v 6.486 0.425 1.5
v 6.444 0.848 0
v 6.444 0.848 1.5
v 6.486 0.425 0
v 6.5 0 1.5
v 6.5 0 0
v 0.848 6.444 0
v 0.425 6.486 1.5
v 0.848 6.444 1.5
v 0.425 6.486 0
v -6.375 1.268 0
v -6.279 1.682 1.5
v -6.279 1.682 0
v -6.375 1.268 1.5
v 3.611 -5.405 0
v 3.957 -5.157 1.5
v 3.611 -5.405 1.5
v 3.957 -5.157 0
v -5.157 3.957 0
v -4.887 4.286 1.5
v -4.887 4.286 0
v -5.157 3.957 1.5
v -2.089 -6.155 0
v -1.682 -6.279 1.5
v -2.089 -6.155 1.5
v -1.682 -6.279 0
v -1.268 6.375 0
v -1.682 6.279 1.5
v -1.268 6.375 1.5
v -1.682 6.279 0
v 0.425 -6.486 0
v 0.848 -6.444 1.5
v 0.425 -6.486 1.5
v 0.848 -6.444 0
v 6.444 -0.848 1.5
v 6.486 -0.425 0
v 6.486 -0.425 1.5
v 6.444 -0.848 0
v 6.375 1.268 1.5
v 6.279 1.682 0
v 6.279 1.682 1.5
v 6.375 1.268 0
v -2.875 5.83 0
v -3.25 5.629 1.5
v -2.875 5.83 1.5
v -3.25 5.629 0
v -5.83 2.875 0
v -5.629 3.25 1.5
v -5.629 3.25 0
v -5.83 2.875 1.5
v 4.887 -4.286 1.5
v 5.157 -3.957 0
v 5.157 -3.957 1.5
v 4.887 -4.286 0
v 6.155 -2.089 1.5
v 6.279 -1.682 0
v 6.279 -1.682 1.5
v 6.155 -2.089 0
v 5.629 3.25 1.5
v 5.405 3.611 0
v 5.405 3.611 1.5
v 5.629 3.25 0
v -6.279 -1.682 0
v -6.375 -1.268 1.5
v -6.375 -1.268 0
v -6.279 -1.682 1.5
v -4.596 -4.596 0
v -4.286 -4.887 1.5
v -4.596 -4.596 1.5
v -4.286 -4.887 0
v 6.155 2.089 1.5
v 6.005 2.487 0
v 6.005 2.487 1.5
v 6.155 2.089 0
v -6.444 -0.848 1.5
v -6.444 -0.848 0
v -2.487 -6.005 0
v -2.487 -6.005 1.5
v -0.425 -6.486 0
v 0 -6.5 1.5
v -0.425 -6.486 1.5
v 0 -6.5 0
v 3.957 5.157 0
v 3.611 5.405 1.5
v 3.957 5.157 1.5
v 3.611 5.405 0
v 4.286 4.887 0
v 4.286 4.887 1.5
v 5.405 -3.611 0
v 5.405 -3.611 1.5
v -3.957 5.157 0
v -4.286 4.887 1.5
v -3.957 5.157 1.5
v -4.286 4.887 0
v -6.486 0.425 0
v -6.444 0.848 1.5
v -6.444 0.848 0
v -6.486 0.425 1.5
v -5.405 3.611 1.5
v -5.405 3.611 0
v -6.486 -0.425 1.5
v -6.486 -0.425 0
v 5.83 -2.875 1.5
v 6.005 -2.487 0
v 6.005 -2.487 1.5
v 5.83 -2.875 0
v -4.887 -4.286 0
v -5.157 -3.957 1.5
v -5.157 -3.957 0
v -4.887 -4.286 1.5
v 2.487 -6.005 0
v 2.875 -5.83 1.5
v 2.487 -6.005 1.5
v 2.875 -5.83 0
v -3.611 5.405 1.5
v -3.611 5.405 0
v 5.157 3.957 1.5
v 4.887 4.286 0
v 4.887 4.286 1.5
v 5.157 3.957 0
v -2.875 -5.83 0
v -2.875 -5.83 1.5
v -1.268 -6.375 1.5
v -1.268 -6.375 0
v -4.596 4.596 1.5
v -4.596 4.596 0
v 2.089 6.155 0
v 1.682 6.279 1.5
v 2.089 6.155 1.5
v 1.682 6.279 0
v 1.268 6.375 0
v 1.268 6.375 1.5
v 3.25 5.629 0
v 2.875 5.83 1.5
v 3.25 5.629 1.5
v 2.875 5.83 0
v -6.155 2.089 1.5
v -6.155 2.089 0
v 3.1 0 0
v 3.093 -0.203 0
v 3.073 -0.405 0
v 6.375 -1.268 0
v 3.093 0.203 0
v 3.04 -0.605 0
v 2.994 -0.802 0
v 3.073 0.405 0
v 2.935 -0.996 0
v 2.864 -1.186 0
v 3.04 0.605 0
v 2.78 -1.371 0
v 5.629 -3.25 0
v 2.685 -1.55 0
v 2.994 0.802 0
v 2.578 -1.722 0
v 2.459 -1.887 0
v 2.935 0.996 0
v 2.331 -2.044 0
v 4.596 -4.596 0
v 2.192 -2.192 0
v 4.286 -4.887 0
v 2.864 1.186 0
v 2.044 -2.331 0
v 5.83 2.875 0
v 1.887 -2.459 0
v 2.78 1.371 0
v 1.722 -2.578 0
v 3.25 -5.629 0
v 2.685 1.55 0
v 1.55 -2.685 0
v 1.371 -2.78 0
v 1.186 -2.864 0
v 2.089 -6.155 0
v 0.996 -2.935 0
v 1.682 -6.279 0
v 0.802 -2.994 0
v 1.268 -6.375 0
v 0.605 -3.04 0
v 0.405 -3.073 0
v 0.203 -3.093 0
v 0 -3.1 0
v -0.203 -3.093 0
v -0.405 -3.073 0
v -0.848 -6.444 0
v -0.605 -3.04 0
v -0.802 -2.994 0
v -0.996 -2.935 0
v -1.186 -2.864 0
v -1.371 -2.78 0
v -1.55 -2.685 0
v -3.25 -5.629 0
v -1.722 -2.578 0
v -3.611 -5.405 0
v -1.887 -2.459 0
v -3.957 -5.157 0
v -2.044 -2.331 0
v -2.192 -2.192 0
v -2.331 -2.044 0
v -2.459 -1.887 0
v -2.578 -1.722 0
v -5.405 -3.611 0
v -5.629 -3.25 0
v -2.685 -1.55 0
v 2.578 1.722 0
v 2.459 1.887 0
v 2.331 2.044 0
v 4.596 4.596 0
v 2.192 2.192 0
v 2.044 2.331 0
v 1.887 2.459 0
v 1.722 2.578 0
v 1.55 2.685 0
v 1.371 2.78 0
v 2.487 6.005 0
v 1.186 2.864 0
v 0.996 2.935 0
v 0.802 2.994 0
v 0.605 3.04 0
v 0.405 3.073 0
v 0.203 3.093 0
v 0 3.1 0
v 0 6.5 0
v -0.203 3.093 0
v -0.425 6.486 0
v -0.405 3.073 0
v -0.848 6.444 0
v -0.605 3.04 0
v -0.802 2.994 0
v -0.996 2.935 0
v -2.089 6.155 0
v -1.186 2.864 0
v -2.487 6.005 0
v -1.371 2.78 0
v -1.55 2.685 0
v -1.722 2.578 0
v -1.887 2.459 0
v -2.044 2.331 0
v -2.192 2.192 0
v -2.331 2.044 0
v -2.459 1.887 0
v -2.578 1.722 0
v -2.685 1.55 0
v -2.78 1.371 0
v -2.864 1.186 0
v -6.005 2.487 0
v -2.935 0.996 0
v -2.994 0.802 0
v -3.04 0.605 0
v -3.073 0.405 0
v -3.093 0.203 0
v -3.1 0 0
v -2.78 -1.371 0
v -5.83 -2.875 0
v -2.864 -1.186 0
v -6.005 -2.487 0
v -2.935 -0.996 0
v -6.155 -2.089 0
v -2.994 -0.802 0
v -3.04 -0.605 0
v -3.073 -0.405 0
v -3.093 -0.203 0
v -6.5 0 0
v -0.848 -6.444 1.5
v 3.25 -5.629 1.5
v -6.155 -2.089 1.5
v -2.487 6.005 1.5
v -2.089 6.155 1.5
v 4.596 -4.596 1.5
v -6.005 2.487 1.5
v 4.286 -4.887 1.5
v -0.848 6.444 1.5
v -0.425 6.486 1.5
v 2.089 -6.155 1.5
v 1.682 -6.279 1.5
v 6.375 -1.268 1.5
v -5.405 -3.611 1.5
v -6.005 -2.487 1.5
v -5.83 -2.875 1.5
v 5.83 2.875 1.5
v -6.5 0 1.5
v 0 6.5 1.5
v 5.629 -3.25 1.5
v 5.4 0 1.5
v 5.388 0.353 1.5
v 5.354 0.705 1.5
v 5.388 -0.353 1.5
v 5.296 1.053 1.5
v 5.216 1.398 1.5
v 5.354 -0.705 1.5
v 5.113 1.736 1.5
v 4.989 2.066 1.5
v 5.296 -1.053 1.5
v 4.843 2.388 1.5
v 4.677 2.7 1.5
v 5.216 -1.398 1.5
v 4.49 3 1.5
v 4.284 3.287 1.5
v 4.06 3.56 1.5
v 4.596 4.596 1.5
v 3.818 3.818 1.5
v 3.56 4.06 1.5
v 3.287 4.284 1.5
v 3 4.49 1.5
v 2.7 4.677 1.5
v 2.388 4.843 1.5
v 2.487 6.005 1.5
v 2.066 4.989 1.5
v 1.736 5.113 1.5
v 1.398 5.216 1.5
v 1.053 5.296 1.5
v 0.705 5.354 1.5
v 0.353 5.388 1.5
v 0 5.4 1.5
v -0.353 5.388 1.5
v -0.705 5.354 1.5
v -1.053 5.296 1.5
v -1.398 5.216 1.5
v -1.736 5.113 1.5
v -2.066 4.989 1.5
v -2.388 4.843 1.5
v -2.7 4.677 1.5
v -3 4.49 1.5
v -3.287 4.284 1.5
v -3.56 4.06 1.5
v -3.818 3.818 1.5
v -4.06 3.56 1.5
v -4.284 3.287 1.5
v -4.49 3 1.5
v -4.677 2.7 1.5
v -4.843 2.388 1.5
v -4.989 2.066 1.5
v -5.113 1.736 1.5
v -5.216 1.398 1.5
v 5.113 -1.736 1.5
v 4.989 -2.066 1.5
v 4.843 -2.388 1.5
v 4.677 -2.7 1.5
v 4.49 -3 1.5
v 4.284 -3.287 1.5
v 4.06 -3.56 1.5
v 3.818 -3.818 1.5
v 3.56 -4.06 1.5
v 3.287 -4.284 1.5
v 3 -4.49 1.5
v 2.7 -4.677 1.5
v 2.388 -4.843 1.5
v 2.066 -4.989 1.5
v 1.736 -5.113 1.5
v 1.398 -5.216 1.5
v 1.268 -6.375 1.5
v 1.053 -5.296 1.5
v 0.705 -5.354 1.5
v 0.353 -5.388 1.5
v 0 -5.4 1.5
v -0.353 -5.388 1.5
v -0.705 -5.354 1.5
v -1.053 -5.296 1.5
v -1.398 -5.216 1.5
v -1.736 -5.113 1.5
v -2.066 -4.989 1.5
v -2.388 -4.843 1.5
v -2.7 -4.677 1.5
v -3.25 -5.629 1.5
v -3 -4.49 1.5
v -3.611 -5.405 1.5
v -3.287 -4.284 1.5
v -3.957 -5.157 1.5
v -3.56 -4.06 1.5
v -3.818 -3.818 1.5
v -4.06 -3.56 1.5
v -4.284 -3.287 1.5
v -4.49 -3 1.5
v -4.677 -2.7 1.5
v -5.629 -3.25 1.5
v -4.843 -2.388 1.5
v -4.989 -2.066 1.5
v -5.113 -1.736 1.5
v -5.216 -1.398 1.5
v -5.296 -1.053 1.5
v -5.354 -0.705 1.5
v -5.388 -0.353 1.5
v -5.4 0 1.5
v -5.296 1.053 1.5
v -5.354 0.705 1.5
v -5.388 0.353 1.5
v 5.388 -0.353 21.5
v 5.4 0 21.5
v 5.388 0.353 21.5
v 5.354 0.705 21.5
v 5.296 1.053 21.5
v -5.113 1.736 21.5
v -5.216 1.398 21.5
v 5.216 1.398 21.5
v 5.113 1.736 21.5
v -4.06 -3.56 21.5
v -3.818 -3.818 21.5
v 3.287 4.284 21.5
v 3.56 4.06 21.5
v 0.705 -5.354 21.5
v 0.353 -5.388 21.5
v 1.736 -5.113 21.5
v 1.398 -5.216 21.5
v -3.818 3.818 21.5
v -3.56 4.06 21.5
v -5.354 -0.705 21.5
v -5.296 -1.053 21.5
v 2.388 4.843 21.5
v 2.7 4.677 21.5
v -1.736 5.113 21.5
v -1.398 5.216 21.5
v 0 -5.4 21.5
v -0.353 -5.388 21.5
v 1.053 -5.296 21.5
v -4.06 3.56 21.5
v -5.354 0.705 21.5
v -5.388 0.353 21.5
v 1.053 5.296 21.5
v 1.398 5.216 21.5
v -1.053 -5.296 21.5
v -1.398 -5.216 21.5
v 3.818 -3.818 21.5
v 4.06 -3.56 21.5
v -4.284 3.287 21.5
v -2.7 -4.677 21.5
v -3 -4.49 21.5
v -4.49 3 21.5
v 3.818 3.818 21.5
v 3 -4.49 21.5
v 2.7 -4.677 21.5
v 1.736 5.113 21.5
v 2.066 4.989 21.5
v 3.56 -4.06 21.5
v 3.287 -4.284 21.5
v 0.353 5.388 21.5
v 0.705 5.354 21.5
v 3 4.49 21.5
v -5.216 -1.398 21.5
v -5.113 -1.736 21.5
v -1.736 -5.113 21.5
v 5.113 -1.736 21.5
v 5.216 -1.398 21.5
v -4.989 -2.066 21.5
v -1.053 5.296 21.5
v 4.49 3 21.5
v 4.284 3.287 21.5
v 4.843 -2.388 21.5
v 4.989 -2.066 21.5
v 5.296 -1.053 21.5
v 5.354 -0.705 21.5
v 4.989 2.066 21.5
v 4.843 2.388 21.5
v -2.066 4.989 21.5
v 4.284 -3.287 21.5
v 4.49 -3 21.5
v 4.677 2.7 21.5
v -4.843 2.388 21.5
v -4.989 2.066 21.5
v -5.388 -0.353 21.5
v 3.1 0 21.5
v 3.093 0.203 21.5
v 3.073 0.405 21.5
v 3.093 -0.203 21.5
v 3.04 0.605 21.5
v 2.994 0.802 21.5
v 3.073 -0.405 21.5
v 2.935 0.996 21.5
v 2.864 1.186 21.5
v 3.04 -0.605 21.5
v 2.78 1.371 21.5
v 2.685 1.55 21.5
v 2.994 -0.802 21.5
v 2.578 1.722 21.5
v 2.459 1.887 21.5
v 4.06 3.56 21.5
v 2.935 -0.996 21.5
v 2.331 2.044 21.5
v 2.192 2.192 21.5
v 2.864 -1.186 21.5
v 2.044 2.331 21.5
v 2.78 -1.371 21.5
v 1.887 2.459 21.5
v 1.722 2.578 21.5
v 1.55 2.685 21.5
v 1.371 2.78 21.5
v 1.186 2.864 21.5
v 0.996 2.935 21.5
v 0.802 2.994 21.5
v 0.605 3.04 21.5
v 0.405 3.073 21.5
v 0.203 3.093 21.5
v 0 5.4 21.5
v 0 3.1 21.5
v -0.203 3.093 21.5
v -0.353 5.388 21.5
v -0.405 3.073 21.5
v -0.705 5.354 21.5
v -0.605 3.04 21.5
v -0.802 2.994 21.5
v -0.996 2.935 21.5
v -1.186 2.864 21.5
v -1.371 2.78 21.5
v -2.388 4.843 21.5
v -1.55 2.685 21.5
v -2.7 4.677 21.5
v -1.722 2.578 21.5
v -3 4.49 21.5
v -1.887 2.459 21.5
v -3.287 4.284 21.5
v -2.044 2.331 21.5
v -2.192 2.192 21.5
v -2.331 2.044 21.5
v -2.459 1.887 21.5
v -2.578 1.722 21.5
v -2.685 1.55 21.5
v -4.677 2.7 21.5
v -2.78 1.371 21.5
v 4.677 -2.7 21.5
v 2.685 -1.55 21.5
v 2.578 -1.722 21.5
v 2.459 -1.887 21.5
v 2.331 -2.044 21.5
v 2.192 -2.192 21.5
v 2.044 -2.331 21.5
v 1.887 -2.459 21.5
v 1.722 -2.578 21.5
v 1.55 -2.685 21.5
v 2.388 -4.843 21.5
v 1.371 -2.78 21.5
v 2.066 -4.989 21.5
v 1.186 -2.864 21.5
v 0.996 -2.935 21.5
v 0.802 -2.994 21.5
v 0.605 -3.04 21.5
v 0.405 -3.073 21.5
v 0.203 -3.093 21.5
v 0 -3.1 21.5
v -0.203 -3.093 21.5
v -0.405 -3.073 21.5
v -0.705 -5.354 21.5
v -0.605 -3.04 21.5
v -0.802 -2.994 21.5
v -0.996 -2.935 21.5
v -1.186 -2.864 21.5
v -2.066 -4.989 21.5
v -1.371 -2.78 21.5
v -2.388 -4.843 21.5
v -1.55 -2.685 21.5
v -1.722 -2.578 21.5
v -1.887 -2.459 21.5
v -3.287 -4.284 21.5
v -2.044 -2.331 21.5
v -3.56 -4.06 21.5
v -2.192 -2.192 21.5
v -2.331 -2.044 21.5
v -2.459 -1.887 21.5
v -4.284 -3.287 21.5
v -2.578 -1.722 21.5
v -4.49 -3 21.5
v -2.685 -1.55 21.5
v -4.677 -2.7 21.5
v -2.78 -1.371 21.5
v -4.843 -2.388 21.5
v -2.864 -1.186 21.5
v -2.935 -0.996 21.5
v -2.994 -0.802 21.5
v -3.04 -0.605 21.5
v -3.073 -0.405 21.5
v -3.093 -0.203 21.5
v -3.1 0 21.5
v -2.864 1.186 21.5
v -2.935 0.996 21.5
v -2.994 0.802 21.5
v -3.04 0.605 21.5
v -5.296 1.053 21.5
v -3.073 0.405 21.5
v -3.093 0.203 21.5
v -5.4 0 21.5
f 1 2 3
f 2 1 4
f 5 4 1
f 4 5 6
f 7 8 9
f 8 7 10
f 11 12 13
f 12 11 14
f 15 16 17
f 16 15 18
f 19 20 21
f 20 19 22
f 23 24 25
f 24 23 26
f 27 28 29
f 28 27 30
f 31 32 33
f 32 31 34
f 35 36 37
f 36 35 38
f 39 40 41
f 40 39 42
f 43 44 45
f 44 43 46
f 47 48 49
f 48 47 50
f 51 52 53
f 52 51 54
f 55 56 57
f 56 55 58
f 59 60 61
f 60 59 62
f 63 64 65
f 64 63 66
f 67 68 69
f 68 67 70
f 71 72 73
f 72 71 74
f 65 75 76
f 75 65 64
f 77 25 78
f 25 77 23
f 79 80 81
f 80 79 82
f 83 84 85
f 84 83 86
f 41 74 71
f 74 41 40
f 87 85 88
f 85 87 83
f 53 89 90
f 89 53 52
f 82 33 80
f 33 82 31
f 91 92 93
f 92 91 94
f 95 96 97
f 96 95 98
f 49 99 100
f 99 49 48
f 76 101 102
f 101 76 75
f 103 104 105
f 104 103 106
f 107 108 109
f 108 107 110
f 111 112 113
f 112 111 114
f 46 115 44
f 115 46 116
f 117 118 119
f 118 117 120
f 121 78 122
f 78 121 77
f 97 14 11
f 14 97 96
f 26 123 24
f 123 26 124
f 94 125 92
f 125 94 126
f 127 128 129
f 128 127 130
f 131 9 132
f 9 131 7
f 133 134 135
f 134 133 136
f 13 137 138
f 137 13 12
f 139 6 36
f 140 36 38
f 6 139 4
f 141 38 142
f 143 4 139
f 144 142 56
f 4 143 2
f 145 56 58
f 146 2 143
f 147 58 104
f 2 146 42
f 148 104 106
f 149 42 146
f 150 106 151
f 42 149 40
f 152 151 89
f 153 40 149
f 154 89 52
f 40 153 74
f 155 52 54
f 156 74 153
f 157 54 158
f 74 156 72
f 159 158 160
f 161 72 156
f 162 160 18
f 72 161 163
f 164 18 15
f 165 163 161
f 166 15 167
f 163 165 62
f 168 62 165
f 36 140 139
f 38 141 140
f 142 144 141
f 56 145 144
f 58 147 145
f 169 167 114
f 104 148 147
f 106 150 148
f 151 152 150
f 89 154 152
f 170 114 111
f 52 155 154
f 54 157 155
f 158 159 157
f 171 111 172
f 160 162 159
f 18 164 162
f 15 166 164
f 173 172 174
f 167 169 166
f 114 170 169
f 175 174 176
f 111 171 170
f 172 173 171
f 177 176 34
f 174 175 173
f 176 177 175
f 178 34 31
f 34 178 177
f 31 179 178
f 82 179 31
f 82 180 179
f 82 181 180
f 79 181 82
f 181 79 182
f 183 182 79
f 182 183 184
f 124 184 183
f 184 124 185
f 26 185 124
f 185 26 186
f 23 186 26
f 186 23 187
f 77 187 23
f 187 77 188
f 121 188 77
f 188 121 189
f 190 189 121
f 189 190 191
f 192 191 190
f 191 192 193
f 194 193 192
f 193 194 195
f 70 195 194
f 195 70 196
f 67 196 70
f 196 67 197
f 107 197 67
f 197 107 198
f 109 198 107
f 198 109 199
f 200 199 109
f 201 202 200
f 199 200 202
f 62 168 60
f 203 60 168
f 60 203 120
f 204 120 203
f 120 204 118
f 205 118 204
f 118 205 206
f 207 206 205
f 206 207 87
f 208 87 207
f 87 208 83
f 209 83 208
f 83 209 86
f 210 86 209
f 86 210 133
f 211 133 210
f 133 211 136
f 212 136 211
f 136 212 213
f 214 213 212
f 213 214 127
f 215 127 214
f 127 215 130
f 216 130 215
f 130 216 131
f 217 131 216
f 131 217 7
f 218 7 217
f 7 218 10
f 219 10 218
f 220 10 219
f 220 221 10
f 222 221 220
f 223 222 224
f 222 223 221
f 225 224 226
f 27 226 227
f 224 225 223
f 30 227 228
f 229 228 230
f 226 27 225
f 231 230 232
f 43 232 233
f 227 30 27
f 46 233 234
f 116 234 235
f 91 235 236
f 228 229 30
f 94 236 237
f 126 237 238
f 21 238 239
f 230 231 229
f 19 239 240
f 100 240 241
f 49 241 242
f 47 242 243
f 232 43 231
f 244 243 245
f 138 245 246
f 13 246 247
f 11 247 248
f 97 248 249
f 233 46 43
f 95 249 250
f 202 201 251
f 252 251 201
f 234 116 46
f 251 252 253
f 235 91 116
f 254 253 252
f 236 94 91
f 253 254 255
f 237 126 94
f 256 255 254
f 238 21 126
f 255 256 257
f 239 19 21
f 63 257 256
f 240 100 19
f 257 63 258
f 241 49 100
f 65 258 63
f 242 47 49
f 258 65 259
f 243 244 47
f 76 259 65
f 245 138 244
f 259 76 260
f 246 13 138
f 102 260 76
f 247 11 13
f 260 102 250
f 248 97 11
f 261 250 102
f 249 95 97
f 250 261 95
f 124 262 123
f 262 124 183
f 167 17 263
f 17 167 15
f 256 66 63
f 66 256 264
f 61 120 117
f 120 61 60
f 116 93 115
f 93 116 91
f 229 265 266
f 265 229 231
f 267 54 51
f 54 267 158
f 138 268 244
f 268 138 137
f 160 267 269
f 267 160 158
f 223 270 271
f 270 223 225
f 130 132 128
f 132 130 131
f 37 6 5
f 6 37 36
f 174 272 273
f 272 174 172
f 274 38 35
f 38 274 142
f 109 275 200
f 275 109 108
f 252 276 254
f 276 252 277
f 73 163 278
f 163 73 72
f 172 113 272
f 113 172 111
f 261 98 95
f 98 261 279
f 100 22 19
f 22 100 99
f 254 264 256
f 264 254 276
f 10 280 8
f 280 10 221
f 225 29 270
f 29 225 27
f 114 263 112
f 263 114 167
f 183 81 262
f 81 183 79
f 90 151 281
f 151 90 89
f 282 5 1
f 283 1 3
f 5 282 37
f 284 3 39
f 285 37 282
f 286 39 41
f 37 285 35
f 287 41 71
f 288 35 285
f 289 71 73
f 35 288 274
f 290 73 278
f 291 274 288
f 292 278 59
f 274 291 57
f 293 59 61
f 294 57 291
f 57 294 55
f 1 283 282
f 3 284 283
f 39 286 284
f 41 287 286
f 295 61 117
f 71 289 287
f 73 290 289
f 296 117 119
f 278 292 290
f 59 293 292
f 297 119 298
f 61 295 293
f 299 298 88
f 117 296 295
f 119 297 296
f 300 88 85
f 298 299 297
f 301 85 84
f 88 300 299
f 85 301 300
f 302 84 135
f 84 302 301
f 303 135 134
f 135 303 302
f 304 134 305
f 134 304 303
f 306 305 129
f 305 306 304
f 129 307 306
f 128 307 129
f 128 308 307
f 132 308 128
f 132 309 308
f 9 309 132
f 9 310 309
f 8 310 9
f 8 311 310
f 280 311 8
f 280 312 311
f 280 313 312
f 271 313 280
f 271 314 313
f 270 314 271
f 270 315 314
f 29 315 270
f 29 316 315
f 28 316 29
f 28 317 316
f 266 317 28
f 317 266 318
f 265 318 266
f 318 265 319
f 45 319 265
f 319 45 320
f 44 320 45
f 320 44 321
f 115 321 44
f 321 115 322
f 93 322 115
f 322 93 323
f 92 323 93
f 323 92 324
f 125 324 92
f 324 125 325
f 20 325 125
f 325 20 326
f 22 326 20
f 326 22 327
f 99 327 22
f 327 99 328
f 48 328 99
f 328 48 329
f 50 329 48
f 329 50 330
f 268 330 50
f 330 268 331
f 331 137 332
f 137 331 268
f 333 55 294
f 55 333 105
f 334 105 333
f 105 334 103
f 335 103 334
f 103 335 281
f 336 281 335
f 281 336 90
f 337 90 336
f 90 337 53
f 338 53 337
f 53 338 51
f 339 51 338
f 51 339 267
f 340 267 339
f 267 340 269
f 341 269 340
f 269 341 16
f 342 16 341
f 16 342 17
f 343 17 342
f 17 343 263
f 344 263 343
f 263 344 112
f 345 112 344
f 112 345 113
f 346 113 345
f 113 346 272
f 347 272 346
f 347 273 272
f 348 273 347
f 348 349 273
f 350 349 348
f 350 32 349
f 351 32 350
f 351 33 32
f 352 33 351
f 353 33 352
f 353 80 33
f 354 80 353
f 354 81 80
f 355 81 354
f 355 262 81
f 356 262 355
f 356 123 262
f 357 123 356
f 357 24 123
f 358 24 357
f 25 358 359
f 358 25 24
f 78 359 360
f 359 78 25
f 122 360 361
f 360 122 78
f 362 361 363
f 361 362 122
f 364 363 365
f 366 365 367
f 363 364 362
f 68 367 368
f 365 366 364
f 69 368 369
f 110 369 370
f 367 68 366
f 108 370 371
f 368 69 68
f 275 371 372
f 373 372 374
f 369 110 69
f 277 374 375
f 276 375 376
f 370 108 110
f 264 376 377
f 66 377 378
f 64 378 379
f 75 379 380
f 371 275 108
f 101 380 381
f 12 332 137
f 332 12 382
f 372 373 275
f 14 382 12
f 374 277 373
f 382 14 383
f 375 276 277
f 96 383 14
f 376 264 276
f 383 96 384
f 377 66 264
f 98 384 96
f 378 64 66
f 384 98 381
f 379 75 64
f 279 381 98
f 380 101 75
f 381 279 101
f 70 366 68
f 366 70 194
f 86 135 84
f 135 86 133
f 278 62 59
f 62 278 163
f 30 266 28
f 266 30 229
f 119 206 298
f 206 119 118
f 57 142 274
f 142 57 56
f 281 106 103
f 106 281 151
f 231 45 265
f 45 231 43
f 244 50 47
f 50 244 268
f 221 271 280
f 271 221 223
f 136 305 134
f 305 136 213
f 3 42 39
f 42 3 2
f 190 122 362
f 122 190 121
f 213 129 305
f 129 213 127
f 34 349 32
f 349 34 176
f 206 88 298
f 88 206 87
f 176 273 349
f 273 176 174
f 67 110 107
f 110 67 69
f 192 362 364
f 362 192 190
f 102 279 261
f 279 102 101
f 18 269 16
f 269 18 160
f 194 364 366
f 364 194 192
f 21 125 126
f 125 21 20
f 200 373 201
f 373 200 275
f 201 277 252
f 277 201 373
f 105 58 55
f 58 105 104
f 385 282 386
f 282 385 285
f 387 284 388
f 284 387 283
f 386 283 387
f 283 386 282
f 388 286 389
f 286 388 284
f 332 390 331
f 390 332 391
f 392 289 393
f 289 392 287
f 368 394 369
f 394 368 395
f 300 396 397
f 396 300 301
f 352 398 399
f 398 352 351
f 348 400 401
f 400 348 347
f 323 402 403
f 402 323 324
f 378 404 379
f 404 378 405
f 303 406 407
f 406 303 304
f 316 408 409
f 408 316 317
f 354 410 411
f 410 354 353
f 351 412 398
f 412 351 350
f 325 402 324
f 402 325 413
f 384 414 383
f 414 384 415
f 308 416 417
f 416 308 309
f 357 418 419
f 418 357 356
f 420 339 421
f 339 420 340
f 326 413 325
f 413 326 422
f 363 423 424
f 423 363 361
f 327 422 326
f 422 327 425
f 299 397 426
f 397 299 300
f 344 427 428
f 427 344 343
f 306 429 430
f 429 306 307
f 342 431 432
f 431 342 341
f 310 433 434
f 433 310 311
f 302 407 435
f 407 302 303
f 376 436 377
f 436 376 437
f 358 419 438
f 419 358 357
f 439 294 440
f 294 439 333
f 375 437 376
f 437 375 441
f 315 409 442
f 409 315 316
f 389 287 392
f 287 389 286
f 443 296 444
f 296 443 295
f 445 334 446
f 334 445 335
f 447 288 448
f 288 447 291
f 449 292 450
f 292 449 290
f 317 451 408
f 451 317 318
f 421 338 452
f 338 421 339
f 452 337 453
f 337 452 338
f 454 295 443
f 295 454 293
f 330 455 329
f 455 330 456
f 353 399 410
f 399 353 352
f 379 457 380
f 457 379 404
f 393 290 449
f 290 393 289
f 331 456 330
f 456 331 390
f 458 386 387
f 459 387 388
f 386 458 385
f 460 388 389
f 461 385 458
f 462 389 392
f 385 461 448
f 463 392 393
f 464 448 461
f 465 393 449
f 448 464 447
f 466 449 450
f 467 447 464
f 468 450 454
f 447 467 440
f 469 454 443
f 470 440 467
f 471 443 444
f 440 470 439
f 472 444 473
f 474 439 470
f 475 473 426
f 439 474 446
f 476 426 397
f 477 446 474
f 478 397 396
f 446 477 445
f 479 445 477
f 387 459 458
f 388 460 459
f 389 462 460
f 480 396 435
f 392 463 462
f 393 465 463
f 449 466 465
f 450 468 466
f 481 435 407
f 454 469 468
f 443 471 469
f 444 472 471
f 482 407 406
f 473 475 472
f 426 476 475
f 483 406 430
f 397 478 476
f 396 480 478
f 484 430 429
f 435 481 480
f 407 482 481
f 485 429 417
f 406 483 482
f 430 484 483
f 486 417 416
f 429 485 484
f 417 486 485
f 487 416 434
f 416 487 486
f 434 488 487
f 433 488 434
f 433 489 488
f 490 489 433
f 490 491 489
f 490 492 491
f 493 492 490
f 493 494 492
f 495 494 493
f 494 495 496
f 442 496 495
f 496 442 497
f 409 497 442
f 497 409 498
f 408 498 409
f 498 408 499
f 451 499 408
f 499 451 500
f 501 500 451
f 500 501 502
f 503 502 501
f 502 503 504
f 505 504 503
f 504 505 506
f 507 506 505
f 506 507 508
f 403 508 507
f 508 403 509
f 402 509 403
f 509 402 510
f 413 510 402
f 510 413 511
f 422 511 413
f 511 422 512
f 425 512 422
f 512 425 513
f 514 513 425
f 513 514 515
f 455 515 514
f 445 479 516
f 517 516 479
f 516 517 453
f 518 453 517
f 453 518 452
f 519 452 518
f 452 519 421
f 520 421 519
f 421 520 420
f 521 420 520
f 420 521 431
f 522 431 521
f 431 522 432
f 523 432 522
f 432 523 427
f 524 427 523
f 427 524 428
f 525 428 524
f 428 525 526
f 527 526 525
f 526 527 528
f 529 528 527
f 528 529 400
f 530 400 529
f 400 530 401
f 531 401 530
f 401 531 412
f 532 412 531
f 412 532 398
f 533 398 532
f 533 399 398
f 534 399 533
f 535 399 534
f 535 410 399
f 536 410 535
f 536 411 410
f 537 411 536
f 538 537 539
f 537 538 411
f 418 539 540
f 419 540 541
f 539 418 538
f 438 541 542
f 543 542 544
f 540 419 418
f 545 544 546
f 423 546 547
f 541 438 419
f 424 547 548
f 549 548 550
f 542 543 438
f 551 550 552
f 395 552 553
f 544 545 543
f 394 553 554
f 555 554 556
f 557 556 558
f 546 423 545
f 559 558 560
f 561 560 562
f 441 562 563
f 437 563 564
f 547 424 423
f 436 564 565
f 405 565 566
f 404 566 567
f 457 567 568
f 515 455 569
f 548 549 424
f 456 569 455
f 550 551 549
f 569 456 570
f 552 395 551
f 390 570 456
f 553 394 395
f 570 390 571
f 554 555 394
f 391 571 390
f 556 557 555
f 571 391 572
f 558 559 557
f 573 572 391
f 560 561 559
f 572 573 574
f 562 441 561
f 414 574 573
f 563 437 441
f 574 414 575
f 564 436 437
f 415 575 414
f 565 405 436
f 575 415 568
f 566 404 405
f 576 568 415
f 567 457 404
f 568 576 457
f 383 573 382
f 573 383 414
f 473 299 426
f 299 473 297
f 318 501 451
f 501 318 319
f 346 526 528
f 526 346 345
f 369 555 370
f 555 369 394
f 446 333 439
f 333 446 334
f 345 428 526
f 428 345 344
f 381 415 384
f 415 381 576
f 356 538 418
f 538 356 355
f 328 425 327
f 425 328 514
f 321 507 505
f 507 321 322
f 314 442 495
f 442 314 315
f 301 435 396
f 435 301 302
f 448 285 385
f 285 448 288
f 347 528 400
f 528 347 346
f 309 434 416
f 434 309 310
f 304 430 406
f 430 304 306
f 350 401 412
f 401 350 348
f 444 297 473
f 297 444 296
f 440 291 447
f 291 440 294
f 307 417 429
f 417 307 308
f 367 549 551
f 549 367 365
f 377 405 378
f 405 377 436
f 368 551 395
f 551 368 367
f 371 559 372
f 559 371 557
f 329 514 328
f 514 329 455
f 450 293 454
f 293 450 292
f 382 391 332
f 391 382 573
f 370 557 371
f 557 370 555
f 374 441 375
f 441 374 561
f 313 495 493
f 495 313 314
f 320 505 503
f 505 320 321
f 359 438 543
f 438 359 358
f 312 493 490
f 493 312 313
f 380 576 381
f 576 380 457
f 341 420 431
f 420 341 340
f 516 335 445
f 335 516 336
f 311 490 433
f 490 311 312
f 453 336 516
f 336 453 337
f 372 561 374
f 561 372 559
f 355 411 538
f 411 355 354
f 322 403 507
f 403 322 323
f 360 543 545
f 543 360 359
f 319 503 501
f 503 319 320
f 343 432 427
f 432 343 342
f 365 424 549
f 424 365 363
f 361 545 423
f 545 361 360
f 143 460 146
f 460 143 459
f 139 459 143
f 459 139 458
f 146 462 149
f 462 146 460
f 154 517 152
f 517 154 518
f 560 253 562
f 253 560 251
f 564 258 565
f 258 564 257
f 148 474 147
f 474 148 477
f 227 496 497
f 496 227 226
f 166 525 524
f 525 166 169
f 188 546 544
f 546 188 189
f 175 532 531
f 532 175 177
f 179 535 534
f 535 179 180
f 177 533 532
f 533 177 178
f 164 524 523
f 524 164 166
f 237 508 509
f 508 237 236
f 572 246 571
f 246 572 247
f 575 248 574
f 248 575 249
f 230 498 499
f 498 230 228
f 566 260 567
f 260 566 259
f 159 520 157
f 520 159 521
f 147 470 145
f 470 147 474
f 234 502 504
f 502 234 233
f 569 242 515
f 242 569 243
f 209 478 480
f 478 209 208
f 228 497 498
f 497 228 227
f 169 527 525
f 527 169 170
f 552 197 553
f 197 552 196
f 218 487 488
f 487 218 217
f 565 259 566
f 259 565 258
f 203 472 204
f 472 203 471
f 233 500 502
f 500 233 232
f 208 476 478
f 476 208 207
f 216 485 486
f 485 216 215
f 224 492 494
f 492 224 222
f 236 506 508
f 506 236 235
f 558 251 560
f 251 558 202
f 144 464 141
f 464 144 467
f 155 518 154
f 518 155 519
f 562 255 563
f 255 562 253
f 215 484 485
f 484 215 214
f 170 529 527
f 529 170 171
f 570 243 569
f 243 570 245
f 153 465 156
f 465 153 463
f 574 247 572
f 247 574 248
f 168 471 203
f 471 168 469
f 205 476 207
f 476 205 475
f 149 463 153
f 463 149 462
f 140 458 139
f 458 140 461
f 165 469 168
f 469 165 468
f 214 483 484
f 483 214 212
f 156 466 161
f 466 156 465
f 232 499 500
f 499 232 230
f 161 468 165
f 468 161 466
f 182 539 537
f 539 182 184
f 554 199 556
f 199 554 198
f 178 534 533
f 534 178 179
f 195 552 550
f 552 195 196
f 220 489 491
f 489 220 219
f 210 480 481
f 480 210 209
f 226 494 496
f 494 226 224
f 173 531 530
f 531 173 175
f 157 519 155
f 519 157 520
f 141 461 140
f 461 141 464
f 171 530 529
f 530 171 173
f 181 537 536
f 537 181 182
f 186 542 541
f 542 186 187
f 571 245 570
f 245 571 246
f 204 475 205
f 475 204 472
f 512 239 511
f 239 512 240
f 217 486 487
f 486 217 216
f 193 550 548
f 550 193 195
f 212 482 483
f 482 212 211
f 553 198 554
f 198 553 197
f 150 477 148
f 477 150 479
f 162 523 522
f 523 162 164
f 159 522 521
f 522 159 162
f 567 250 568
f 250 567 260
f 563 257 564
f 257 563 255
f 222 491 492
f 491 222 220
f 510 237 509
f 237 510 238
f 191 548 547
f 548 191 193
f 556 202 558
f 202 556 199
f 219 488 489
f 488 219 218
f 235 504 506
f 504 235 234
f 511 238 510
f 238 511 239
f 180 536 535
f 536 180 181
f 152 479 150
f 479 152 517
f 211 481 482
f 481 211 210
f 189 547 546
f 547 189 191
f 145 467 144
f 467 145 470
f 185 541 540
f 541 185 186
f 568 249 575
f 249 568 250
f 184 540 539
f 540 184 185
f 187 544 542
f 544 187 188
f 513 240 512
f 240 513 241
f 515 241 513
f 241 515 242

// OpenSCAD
// PCR tube adapter sleeve - print upside down
// Units: mm

$fn = 96;

// --- Dimensions ---
collar_d      = 13;    // collar outer diameter (on bed)
collar_h      = 1.5;   // collar thickness (z = 0 to 1.5)
sleeve_od     = 10.8;  // sleeve outer diameter
sleeve_h      = 20;    // sleeve body height above collar (z = 1.5 to 21.5)
bore_d        = 6.2;   // through-bore diameter
eps           = 0.5;   // cutter overshoot past faces

total_h = collar_h + sleeve_h;  // full height (21.5)

difference() {
    union() {
        // Collar
        cylinder(d = collar_d, h = collar_h);
        // Sleeve body (slightly overlapping into collar for a clean union)
        translate([0, 0, collar_h - 0.01])
            cylinder(d = sleeve_od, h = sleeve_h + 0.01);
    }
    // Through-bore
    translate([0, 0, -eps])
        cylinder(d = bore_d, h = total_h + 2 * eps);
}
